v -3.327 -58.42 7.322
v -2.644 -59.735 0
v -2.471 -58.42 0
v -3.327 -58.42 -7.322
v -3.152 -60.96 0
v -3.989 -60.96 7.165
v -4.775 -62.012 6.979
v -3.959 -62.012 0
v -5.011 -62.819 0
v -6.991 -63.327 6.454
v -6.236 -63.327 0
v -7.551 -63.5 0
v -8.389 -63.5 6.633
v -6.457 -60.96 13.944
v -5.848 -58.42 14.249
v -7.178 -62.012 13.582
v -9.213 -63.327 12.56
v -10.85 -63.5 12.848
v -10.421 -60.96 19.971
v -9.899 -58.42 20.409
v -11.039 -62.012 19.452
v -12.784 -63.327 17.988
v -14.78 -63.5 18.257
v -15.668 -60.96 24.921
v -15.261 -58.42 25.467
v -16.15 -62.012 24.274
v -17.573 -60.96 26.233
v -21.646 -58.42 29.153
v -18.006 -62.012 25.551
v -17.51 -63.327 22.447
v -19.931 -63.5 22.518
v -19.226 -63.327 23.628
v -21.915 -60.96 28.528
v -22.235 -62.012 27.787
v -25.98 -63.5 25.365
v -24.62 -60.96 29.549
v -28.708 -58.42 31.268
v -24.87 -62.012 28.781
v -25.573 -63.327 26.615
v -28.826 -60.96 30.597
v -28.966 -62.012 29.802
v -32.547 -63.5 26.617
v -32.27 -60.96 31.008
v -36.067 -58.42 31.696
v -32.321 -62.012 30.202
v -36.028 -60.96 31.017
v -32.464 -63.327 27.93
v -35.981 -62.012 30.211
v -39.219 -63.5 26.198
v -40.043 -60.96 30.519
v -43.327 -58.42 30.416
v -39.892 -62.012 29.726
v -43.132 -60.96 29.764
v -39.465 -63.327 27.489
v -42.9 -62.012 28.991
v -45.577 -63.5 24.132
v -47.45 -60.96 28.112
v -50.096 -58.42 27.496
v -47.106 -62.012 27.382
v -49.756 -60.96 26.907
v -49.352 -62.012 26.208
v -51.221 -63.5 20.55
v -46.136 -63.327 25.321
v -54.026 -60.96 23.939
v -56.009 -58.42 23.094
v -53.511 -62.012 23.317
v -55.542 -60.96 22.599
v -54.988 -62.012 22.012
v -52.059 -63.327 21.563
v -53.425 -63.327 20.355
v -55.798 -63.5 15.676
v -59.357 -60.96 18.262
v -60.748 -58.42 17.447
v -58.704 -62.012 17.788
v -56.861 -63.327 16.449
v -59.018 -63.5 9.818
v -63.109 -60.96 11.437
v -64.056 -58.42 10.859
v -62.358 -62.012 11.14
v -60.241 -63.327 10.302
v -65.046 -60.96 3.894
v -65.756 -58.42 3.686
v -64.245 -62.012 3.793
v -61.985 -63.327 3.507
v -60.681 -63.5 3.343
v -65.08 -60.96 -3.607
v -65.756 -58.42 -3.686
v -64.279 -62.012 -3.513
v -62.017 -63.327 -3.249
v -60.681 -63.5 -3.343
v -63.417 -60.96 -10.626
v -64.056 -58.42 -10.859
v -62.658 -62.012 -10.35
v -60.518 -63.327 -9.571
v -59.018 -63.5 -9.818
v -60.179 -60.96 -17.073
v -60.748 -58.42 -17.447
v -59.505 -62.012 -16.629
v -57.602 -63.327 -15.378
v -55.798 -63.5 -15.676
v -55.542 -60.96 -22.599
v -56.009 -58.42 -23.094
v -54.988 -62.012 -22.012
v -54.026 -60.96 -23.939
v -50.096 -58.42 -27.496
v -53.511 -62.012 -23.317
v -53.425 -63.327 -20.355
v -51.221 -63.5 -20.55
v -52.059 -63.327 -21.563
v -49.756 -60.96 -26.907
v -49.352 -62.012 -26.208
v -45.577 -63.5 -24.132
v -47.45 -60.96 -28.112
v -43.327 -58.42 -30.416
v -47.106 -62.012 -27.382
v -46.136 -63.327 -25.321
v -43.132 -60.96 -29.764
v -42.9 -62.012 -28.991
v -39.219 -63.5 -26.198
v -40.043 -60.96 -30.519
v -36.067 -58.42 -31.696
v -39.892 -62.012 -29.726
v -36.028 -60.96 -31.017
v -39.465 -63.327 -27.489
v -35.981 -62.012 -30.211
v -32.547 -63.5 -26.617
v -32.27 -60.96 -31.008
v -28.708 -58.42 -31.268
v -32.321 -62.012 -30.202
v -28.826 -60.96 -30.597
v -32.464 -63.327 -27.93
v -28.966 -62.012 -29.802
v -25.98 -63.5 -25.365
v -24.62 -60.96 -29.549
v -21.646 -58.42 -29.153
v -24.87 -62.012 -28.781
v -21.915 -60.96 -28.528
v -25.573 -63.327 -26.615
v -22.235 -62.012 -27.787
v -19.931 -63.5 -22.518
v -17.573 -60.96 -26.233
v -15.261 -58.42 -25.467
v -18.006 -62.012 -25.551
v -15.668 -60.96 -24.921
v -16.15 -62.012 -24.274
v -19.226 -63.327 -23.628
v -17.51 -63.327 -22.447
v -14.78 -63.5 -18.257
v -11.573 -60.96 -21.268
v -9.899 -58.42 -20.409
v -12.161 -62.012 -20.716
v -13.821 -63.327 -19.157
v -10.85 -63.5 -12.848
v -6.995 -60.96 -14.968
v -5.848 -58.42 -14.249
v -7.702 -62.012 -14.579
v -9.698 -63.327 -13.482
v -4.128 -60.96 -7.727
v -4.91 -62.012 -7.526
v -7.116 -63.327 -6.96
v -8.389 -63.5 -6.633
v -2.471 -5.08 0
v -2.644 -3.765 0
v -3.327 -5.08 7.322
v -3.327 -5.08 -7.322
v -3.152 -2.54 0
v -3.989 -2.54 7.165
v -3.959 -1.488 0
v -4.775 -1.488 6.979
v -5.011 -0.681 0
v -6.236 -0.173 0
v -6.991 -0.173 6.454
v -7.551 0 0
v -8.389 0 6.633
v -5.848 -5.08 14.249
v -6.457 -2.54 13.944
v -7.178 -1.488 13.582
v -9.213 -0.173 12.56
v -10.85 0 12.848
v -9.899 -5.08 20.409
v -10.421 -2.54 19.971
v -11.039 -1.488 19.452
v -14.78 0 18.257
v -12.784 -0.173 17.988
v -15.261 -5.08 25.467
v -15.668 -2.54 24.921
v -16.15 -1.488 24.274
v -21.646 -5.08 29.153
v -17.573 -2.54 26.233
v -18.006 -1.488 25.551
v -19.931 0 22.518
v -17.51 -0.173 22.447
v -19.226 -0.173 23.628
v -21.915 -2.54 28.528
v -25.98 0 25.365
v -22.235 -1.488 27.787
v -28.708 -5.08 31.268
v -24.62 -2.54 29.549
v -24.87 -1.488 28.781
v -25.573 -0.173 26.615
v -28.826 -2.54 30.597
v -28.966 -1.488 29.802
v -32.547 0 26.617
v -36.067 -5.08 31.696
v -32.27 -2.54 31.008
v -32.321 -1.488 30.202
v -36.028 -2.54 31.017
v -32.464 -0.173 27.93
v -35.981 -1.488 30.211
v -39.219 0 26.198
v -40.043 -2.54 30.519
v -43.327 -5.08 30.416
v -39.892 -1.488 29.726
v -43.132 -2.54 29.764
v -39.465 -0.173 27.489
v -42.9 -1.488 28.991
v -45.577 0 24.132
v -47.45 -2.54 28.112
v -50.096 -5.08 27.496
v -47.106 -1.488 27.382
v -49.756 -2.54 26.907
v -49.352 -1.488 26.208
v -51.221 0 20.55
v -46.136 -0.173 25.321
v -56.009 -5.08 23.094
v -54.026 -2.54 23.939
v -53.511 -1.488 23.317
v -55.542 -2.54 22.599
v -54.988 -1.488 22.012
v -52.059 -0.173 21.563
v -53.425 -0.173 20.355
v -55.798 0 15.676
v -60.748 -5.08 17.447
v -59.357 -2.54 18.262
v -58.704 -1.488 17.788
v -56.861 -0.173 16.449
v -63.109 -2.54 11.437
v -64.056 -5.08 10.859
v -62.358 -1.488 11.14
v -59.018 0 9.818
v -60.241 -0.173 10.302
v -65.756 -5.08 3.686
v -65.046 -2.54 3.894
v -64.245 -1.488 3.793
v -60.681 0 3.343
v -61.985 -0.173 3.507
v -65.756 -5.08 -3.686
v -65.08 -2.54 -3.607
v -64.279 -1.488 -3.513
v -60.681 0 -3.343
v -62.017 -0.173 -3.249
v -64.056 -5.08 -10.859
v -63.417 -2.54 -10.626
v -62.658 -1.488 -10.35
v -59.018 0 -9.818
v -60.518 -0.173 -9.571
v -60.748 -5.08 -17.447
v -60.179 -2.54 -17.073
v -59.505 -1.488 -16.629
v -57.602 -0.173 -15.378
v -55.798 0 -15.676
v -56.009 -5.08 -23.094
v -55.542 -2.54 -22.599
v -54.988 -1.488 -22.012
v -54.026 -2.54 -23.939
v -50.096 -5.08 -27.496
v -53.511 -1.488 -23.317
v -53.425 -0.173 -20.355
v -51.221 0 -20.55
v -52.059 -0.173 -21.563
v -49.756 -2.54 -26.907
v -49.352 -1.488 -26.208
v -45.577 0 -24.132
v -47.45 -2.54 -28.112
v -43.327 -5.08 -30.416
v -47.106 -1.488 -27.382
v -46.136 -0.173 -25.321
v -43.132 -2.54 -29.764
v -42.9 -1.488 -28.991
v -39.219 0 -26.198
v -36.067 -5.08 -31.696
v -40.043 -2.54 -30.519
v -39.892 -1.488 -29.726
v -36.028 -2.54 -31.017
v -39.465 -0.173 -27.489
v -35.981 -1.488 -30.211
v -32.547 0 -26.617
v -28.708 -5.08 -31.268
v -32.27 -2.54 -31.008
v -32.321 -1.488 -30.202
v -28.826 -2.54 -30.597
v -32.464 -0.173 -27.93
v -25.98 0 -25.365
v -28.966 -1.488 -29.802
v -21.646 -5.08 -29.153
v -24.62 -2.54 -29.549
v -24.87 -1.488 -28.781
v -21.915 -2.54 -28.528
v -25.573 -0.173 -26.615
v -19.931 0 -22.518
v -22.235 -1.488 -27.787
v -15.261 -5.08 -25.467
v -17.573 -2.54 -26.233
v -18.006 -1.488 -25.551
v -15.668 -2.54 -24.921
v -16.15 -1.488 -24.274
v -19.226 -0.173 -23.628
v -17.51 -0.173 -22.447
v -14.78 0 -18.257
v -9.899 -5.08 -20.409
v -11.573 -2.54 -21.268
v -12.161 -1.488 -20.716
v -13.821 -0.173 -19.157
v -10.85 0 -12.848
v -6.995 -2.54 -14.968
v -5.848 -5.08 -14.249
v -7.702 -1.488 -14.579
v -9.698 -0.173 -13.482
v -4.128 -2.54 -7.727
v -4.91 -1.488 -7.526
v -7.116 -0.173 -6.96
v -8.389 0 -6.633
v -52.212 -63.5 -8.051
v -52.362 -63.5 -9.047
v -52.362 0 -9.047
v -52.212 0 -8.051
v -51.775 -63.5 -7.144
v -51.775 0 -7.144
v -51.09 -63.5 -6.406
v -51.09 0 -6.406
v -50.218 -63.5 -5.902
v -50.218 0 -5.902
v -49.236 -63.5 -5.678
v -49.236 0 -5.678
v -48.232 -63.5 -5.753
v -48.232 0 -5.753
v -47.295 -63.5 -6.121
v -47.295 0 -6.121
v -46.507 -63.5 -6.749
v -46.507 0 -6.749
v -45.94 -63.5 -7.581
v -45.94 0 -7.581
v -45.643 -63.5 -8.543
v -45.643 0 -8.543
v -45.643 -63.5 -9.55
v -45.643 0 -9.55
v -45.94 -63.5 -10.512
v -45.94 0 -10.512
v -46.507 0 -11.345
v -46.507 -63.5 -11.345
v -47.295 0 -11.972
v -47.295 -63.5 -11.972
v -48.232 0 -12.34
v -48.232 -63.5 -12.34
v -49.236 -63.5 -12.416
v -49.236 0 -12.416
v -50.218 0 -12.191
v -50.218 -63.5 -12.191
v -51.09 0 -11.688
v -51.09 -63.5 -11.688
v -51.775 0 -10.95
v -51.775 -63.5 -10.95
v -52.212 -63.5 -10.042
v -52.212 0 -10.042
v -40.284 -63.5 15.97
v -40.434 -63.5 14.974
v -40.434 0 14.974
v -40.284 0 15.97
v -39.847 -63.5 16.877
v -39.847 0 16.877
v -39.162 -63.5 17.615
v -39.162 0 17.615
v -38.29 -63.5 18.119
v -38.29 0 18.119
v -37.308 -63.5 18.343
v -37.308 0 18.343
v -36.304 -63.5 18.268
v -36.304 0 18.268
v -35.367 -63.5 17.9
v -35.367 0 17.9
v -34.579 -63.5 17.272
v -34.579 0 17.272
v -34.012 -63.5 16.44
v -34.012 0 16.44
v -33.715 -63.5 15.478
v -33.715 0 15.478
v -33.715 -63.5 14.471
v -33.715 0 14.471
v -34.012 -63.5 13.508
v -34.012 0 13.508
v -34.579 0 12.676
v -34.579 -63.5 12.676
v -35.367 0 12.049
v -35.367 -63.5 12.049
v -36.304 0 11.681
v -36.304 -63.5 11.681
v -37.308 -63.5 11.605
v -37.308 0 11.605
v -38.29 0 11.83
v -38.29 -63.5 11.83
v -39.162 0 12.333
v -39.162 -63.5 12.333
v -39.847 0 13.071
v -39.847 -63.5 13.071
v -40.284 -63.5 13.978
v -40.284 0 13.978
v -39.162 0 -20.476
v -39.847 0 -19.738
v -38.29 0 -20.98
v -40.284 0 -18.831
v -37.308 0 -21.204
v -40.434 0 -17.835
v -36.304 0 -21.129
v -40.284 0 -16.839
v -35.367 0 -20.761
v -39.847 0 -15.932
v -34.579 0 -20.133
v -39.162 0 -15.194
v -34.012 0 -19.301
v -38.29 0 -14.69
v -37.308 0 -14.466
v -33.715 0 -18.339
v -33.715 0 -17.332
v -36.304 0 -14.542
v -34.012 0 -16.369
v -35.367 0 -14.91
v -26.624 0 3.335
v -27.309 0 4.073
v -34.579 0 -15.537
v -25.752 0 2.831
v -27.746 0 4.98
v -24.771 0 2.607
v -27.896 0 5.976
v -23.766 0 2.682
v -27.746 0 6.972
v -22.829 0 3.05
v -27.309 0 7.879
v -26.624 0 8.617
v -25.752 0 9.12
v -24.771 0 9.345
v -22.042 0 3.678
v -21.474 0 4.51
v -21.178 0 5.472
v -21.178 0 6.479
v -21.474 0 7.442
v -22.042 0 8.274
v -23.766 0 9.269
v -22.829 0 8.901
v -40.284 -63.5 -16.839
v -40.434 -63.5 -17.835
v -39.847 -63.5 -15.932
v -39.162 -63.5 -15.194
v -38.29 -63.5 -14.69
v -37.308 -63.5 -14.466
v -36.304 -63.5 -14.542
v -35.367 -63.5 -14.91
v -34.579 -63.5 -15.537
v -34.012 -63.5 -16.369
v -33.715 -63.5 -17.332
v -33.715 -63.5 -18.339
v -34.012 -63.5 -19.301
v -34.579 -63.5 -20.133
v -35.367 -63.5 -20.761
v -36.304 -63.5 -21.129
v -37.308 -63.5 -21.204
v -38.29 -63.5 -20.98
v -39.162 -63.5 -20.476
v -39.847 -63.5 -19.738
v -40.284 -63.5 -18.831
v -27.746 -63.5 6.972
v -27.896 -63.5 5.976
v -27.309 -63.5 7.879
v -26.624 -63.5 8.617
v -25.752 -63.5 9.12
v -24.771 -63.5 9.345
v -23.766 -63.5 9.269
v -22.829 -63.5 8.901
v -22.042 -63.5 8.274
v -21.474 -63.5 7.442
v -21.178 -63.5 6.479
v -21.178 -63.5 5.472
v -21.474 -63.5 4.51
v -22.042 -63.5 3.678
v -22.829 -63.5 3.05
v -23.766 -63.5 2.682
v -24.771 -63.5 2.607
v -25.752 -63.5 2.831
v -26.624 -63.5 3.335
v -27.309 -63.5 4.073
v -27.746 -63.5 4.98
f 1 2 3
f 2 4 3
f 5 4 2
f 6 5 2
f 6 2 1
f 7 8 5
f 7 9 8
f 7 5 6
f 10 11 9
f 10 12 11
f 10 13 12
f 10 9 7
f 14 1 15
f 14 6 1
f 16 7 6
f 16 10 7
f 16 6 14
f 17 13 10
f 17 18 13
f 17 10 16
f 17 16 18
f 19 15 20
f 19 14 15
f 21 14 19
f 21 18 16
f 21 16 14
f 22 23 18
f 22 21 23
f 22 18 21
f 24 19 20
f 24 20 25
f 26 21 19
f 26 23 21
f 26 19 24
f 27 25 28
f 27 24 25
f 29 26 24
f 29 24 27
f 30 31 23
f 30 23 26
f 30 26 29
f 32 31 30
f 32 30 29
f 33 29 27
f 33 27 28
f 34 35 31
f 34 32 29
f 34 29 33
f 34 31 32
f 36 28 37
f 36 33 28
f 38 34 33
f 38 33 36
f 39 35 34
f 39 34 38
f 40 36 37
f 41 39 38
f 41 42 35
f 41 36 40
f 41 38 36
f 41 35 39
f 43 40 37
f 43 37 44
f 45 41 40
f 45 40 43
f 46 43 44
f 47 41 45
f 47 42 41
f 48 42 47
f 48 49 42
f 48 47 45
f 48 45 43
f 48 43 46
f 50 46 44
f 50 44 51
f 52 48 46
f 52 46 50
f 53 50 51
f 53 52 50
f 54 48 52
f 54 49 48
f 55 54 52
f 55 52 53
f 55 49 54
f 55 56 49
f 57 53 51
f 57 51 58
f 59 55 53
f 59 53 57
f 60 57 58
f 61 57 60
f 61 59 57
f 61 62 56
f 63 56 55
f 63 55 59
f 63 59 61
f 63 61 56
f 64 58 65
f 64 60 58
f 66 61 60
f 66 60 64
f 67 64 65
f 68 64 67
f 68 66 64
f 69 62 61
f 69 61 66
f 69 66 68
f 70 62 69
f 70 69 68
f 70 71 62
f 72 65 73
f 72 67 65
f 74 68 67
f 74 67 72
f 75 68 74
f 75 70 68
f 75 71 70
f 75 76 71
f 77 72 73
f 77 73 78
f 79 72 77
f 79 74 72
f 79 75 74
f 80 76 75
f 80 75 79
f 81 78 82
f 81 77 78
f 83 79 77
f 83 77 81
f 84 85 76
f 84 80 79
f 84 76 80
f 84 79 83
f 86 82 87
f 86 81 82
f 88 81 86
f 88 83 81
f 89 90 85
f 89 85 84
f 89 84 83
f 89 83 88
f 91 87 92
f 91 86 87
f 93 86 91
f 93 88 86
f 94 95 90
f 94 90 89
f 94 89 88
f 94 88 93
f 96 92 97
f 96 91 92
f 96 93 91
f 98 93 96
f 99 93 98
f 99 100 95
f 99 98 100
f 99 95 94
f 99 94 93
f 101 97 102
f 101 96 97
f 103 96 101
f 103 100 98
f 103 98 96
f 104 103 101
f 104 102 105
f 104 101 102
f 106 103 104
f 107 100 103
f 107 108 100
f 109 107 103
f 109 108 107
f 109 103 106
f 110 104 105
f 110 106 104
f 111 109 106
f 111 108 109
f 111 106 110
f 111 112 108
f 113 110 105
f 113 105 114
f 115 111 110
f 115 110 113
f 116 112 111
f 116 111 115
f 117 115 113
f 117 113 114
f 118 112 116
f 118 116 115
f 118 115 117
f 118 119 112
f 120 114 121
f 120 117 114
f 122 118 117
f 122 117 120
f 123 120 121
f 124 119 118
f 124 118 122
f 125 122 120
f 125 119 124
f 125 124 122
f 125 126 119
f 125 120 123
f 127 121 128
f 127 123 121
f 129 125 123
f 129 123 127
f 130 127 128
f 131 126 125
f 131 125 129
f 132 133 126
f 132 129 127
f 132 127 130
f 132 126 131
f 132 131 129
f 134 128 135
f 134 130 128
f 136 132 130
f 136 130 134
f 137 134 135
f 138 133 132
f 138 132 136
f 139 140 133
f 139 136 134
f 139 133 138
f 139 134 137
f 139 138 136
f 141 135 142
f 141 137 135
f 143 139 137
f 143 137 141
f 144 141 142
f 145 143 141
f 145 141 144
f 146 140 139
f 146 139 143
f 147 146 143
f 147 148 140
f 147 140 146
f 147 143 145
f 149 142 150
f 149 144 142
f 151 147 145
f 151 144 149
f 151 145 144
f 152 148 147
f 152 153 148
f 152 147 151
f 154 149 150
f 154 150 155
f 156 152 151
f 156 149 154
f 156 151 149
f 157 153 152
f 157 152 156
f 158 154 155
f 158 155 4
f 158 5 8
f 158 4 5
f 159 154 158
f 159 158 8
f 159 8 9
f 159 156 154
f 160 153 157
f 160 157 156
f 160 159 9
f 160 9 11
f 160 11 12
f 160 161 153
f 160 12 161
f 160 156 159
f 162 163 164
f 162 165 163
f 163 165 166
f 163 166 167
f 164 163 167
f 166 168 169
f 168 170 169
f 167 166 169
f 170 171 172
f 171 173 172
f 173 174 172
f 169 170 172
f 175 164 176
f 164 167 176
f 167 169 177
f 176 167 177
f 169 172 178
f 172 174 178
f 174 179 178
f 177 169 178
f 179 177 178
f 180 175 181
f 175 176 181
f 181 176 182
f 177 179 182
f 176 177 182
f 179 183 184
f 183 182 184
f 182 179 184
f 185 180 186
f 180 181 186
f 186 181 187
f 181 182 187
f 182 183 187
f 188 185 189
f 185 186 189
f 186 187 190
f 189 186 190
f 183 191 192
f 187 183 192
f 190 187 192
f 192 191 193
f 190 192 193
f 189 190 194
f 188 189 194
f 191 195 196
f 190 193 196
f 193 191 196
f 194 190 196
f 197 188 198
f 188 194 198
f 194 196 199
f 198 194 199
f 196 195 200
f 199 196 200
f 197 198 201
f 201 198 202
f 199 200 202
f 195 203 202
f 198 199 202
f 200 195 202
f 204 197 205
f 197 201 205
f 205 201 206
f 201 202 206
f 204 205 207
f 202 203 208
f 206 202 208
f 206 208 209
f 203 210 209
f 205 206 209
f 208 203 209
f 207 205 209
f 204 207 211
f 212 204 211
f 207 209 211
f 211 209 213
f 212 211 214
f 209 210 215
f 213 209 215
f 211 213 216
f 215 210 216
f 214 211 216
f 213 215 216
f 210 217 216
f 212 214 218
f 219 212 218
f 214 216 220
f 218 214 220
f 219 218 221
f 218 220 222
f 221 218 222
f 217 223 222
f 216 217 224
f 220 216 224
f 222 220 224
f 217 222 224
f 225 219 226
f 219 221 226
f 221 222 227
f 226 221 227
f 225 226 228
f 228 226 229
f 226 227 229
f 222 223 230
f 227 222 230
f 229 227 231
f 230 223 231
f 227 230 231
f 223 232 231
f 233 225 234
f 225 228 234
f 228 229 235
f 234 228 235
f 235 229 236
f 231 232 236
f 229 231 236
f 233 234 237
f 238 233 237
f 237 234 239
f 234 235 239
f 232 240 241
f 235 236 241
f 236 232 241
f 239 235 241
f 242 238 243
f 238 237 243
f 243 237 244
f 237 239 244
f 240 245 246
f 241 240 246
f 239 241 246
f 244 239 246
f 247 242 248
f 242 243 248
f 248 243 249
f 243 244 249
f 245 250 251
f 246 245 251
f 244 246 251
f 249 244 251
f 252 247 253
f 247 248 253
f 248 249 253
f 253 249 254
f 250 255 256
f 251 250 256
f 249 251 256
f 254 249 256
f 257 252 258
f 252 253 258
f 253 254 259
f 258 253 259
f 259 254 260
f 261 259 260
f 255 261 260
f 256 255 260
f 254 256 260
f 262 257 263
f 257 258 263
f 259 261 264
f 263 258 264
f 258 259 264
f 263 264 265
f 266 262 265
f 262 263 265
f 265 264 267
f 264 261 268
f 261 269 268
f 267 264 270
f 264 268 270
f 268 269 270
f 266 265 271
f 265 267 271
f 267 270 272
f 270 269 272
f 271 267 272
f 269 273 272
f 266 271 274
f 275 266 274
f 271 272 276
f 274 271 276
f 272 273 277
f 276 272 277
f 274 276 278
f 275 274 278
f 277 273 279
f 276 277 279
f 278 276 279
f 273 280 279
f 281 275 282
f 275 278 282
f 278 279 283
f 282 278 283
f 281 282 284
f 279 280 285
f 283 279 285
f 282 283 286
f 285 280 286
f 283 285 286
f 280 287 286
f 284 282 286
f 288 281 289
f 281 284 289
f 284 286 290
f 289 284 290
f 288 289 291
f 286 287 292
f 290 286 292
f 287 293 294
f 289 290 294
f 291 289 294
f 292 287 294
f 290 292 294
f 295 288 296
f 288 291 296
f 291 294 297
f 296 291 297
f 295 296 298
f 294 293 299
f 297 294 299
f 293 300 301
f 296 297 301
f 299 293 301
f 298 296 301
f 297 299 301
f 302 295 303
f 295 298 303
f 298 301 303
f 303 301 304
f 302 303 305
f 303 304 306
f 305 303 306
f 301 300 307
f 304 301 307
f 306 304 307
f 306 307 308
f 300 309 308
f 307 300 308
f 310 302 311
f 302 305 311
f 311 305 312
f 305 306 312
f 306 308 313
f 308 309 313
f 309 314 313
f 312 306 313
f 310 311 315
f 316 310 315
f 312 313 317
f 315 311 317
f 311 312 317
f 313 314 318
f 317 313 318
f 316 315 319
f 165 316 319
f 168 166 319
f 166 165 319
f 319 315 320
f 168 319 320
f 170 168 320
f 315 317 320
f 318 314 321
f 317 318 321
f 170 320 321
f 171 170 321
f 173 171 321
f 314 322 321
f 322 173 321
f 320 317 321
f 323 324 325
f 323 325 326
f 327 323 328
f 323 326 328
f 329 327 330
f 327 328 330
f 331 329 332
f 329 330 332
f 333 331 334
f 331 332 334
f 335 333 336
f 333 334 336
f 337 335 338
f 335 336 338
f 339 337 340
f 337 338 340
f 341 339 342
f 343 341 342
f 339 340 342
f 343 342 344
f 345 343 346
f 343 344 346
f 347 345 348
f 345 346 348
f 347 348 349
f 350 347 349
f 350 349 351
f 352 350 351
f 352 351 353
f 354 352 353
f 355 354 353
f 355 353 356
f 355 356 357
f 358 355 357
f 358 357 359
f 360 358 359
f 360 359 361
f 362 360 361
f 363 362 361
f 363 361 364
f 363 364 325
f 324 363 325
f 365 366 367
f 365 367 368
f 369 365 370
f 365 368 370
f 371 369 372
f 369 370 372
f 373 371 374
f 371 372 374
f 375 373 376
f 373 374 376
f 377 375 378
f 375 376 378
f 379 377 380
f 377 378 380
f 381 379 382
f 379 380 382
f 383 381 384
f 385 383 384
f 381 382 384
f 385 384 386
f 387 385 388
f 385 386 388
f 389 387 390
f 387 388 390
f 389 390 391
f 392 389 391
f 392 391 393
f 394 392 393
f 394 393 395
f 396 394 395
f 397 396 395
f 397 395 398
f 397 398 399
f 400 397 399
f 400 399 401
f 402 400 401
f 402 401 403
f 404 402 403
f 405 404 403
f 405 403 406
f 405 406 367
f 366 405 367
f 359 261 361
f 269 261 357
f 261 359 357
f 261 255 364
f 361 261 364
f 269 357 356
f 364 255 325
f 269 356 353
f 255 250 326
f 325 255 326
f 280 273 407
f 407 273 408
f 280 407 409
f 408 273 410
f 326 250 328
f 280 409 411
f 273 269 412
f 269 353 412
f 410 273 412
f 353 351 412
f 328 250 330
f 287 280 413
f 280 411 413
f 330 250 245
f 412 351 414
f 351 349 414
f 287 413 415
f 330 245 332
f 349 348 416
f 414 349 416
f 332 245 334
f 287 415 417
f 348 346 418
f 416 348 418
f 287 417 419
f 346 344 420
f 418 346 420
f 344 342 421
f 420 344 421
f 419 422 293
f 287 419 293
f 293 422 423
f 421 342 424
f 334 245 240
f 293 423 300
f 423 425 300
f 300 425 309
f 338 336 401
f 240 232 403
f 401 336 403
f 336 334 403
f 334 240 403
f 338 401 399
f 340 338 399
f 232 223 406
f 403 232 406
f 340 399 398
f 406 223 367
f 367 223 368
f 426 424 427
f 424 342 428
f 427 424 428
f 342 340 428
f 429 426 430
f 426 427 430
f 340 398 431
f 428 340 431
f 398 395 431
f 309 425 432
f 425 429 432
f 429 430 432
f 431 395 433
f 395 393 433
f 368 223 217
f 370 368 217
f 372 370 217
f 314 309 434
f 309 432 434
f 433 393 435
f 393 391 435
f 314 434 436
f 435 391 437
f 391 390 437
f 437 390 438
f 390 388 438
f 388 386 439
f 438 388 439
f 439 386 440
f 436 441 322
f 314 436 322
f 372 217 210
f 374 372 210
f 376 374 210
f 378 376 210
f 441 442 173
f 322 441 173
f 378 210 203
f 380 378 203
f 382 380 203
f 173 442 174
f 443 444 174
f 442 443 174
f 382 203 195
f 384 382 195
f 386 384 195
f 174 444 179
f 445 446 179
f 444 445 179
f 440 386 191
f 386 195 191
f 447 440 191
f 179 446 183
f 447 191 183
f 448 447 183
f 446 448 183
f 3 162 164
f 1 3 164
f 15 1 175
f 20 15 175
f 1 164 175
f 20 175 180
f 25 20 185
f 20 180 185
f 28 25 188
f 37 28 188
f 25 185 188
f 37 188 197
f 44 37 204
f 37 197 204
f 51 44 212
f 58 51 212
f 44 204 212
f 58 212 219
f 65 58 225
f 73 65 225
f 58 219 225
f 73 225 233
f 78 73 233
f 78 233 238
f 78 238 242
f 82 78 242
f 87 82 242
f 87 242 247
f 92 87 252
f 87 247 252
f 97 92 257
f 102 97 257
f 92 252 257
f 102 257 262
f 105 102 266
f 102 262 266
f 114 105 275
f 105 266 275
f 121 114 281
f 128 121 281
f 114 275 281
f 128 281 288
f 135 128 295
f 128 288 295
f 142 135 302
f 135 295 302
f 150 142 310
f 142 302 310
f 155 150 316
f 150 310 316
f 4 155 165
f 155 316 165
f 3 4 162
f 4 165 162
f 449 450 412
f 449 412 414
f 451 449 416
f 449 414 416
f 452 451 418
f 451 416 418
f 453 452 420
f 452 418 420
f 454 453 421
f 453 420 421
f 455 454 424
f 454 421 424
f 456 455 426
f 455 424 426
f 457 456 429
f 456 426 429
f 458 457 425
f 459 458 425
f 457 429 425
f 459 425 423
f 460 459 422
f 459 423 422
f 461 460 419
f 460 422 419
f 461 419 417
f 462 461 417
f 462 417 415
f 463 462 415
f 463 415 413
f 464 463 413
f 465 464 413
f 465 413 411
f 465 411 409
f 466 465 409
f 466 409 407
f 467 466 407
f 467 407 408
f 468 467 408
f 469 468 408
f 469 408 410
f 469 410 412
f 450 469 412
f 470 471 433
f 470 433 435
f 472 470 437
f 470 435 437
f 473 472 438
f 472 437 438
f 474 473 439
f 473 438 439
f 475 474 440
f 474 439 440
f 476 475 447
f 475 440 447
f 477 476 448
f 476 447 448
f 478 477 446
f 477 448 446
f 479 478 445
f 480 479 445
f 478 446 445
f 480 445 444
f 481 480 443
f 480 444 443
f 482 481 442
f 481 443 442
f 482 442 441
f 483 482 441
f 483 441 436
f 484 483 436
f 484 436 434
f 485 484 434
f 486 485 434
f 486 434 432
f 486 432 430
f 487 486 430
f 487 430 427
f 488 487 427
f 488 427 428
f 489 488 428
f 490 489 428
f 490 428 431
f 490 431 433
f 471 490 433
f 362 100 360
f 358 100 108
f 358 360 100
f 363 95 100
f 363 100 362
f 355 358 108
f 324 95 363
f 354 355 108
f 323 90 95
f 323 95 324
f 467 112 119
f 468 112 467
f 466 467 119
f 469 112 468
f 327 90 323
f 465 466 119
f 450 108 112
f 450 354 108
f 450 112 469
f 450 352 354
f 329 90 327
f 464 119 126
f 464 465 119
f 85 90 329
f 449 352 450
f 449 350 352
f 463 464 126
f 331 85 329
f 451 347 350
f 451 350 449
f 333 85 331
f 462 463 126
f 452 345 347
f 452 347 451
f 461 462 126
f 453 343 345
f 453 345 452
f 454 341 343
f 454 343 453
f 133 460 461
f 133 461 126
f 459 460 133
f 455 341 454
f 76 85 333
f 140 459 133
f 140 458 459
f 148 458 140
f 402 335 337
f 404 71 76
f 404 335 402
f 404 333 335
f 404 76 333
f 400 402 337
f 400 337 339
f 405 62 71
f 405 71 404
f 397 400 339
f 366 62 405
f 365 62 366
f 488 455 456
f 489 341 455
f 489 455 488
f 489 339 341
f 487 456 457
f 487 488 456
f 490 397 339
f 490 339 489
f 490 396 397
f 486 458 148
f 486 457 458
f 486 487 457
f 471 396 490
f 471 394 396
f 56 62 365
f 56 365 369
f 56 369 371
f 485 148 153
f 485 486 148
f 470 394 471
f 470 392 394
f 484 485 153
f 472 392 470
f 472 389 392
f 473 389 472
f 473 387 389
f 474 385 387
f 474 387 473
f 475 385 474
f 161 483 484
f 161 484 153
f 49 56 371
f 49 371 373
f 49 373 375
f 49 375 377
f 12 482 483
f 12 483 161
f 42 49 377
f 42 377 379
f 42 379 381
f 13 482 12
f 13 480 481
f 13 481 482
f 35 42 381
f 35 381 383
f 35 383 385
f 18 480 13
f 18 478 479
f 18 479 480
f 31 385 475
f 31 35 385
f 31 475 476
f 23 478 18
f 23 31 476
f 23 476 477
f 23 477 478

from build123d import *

# Parameters (mm, degrees)
F0_R     = 31.75
F1_DEPTH = 63.5
F2_R     = 5.08
F4_D     = 6.7564


with BuildPart() as f1:
    # F0 (on Front) → F1 (new body)
    with BuildSketch(Plane.XZ):
        with Locations((-34.2211462557, 0)):
            Circle(F0_R)
    extrude(amount=F1_DEPTH)

    # F2
    f2_edges = [f1.edges().sort_by_distance(p)[0] for p in [
        (-2.471146, -31.75, 0),
        (-65.971146, 0, 0),
        (-65.971146, -63.5, 0),
    ]]
    fillet(f2_edges, radius=F2_R)

    # F4 (through all)
    with Locations(Plane.XZ.offset(63.5)):
        with Locations((-24.5181079954, 5.975802429), (-37.0556861162, 14.9742206559), (-48.9838346839, -9.0467510745), (-37.0556861162, -17.8351700306)):
            Hole(F4_D / 2)


solid = f1.part
